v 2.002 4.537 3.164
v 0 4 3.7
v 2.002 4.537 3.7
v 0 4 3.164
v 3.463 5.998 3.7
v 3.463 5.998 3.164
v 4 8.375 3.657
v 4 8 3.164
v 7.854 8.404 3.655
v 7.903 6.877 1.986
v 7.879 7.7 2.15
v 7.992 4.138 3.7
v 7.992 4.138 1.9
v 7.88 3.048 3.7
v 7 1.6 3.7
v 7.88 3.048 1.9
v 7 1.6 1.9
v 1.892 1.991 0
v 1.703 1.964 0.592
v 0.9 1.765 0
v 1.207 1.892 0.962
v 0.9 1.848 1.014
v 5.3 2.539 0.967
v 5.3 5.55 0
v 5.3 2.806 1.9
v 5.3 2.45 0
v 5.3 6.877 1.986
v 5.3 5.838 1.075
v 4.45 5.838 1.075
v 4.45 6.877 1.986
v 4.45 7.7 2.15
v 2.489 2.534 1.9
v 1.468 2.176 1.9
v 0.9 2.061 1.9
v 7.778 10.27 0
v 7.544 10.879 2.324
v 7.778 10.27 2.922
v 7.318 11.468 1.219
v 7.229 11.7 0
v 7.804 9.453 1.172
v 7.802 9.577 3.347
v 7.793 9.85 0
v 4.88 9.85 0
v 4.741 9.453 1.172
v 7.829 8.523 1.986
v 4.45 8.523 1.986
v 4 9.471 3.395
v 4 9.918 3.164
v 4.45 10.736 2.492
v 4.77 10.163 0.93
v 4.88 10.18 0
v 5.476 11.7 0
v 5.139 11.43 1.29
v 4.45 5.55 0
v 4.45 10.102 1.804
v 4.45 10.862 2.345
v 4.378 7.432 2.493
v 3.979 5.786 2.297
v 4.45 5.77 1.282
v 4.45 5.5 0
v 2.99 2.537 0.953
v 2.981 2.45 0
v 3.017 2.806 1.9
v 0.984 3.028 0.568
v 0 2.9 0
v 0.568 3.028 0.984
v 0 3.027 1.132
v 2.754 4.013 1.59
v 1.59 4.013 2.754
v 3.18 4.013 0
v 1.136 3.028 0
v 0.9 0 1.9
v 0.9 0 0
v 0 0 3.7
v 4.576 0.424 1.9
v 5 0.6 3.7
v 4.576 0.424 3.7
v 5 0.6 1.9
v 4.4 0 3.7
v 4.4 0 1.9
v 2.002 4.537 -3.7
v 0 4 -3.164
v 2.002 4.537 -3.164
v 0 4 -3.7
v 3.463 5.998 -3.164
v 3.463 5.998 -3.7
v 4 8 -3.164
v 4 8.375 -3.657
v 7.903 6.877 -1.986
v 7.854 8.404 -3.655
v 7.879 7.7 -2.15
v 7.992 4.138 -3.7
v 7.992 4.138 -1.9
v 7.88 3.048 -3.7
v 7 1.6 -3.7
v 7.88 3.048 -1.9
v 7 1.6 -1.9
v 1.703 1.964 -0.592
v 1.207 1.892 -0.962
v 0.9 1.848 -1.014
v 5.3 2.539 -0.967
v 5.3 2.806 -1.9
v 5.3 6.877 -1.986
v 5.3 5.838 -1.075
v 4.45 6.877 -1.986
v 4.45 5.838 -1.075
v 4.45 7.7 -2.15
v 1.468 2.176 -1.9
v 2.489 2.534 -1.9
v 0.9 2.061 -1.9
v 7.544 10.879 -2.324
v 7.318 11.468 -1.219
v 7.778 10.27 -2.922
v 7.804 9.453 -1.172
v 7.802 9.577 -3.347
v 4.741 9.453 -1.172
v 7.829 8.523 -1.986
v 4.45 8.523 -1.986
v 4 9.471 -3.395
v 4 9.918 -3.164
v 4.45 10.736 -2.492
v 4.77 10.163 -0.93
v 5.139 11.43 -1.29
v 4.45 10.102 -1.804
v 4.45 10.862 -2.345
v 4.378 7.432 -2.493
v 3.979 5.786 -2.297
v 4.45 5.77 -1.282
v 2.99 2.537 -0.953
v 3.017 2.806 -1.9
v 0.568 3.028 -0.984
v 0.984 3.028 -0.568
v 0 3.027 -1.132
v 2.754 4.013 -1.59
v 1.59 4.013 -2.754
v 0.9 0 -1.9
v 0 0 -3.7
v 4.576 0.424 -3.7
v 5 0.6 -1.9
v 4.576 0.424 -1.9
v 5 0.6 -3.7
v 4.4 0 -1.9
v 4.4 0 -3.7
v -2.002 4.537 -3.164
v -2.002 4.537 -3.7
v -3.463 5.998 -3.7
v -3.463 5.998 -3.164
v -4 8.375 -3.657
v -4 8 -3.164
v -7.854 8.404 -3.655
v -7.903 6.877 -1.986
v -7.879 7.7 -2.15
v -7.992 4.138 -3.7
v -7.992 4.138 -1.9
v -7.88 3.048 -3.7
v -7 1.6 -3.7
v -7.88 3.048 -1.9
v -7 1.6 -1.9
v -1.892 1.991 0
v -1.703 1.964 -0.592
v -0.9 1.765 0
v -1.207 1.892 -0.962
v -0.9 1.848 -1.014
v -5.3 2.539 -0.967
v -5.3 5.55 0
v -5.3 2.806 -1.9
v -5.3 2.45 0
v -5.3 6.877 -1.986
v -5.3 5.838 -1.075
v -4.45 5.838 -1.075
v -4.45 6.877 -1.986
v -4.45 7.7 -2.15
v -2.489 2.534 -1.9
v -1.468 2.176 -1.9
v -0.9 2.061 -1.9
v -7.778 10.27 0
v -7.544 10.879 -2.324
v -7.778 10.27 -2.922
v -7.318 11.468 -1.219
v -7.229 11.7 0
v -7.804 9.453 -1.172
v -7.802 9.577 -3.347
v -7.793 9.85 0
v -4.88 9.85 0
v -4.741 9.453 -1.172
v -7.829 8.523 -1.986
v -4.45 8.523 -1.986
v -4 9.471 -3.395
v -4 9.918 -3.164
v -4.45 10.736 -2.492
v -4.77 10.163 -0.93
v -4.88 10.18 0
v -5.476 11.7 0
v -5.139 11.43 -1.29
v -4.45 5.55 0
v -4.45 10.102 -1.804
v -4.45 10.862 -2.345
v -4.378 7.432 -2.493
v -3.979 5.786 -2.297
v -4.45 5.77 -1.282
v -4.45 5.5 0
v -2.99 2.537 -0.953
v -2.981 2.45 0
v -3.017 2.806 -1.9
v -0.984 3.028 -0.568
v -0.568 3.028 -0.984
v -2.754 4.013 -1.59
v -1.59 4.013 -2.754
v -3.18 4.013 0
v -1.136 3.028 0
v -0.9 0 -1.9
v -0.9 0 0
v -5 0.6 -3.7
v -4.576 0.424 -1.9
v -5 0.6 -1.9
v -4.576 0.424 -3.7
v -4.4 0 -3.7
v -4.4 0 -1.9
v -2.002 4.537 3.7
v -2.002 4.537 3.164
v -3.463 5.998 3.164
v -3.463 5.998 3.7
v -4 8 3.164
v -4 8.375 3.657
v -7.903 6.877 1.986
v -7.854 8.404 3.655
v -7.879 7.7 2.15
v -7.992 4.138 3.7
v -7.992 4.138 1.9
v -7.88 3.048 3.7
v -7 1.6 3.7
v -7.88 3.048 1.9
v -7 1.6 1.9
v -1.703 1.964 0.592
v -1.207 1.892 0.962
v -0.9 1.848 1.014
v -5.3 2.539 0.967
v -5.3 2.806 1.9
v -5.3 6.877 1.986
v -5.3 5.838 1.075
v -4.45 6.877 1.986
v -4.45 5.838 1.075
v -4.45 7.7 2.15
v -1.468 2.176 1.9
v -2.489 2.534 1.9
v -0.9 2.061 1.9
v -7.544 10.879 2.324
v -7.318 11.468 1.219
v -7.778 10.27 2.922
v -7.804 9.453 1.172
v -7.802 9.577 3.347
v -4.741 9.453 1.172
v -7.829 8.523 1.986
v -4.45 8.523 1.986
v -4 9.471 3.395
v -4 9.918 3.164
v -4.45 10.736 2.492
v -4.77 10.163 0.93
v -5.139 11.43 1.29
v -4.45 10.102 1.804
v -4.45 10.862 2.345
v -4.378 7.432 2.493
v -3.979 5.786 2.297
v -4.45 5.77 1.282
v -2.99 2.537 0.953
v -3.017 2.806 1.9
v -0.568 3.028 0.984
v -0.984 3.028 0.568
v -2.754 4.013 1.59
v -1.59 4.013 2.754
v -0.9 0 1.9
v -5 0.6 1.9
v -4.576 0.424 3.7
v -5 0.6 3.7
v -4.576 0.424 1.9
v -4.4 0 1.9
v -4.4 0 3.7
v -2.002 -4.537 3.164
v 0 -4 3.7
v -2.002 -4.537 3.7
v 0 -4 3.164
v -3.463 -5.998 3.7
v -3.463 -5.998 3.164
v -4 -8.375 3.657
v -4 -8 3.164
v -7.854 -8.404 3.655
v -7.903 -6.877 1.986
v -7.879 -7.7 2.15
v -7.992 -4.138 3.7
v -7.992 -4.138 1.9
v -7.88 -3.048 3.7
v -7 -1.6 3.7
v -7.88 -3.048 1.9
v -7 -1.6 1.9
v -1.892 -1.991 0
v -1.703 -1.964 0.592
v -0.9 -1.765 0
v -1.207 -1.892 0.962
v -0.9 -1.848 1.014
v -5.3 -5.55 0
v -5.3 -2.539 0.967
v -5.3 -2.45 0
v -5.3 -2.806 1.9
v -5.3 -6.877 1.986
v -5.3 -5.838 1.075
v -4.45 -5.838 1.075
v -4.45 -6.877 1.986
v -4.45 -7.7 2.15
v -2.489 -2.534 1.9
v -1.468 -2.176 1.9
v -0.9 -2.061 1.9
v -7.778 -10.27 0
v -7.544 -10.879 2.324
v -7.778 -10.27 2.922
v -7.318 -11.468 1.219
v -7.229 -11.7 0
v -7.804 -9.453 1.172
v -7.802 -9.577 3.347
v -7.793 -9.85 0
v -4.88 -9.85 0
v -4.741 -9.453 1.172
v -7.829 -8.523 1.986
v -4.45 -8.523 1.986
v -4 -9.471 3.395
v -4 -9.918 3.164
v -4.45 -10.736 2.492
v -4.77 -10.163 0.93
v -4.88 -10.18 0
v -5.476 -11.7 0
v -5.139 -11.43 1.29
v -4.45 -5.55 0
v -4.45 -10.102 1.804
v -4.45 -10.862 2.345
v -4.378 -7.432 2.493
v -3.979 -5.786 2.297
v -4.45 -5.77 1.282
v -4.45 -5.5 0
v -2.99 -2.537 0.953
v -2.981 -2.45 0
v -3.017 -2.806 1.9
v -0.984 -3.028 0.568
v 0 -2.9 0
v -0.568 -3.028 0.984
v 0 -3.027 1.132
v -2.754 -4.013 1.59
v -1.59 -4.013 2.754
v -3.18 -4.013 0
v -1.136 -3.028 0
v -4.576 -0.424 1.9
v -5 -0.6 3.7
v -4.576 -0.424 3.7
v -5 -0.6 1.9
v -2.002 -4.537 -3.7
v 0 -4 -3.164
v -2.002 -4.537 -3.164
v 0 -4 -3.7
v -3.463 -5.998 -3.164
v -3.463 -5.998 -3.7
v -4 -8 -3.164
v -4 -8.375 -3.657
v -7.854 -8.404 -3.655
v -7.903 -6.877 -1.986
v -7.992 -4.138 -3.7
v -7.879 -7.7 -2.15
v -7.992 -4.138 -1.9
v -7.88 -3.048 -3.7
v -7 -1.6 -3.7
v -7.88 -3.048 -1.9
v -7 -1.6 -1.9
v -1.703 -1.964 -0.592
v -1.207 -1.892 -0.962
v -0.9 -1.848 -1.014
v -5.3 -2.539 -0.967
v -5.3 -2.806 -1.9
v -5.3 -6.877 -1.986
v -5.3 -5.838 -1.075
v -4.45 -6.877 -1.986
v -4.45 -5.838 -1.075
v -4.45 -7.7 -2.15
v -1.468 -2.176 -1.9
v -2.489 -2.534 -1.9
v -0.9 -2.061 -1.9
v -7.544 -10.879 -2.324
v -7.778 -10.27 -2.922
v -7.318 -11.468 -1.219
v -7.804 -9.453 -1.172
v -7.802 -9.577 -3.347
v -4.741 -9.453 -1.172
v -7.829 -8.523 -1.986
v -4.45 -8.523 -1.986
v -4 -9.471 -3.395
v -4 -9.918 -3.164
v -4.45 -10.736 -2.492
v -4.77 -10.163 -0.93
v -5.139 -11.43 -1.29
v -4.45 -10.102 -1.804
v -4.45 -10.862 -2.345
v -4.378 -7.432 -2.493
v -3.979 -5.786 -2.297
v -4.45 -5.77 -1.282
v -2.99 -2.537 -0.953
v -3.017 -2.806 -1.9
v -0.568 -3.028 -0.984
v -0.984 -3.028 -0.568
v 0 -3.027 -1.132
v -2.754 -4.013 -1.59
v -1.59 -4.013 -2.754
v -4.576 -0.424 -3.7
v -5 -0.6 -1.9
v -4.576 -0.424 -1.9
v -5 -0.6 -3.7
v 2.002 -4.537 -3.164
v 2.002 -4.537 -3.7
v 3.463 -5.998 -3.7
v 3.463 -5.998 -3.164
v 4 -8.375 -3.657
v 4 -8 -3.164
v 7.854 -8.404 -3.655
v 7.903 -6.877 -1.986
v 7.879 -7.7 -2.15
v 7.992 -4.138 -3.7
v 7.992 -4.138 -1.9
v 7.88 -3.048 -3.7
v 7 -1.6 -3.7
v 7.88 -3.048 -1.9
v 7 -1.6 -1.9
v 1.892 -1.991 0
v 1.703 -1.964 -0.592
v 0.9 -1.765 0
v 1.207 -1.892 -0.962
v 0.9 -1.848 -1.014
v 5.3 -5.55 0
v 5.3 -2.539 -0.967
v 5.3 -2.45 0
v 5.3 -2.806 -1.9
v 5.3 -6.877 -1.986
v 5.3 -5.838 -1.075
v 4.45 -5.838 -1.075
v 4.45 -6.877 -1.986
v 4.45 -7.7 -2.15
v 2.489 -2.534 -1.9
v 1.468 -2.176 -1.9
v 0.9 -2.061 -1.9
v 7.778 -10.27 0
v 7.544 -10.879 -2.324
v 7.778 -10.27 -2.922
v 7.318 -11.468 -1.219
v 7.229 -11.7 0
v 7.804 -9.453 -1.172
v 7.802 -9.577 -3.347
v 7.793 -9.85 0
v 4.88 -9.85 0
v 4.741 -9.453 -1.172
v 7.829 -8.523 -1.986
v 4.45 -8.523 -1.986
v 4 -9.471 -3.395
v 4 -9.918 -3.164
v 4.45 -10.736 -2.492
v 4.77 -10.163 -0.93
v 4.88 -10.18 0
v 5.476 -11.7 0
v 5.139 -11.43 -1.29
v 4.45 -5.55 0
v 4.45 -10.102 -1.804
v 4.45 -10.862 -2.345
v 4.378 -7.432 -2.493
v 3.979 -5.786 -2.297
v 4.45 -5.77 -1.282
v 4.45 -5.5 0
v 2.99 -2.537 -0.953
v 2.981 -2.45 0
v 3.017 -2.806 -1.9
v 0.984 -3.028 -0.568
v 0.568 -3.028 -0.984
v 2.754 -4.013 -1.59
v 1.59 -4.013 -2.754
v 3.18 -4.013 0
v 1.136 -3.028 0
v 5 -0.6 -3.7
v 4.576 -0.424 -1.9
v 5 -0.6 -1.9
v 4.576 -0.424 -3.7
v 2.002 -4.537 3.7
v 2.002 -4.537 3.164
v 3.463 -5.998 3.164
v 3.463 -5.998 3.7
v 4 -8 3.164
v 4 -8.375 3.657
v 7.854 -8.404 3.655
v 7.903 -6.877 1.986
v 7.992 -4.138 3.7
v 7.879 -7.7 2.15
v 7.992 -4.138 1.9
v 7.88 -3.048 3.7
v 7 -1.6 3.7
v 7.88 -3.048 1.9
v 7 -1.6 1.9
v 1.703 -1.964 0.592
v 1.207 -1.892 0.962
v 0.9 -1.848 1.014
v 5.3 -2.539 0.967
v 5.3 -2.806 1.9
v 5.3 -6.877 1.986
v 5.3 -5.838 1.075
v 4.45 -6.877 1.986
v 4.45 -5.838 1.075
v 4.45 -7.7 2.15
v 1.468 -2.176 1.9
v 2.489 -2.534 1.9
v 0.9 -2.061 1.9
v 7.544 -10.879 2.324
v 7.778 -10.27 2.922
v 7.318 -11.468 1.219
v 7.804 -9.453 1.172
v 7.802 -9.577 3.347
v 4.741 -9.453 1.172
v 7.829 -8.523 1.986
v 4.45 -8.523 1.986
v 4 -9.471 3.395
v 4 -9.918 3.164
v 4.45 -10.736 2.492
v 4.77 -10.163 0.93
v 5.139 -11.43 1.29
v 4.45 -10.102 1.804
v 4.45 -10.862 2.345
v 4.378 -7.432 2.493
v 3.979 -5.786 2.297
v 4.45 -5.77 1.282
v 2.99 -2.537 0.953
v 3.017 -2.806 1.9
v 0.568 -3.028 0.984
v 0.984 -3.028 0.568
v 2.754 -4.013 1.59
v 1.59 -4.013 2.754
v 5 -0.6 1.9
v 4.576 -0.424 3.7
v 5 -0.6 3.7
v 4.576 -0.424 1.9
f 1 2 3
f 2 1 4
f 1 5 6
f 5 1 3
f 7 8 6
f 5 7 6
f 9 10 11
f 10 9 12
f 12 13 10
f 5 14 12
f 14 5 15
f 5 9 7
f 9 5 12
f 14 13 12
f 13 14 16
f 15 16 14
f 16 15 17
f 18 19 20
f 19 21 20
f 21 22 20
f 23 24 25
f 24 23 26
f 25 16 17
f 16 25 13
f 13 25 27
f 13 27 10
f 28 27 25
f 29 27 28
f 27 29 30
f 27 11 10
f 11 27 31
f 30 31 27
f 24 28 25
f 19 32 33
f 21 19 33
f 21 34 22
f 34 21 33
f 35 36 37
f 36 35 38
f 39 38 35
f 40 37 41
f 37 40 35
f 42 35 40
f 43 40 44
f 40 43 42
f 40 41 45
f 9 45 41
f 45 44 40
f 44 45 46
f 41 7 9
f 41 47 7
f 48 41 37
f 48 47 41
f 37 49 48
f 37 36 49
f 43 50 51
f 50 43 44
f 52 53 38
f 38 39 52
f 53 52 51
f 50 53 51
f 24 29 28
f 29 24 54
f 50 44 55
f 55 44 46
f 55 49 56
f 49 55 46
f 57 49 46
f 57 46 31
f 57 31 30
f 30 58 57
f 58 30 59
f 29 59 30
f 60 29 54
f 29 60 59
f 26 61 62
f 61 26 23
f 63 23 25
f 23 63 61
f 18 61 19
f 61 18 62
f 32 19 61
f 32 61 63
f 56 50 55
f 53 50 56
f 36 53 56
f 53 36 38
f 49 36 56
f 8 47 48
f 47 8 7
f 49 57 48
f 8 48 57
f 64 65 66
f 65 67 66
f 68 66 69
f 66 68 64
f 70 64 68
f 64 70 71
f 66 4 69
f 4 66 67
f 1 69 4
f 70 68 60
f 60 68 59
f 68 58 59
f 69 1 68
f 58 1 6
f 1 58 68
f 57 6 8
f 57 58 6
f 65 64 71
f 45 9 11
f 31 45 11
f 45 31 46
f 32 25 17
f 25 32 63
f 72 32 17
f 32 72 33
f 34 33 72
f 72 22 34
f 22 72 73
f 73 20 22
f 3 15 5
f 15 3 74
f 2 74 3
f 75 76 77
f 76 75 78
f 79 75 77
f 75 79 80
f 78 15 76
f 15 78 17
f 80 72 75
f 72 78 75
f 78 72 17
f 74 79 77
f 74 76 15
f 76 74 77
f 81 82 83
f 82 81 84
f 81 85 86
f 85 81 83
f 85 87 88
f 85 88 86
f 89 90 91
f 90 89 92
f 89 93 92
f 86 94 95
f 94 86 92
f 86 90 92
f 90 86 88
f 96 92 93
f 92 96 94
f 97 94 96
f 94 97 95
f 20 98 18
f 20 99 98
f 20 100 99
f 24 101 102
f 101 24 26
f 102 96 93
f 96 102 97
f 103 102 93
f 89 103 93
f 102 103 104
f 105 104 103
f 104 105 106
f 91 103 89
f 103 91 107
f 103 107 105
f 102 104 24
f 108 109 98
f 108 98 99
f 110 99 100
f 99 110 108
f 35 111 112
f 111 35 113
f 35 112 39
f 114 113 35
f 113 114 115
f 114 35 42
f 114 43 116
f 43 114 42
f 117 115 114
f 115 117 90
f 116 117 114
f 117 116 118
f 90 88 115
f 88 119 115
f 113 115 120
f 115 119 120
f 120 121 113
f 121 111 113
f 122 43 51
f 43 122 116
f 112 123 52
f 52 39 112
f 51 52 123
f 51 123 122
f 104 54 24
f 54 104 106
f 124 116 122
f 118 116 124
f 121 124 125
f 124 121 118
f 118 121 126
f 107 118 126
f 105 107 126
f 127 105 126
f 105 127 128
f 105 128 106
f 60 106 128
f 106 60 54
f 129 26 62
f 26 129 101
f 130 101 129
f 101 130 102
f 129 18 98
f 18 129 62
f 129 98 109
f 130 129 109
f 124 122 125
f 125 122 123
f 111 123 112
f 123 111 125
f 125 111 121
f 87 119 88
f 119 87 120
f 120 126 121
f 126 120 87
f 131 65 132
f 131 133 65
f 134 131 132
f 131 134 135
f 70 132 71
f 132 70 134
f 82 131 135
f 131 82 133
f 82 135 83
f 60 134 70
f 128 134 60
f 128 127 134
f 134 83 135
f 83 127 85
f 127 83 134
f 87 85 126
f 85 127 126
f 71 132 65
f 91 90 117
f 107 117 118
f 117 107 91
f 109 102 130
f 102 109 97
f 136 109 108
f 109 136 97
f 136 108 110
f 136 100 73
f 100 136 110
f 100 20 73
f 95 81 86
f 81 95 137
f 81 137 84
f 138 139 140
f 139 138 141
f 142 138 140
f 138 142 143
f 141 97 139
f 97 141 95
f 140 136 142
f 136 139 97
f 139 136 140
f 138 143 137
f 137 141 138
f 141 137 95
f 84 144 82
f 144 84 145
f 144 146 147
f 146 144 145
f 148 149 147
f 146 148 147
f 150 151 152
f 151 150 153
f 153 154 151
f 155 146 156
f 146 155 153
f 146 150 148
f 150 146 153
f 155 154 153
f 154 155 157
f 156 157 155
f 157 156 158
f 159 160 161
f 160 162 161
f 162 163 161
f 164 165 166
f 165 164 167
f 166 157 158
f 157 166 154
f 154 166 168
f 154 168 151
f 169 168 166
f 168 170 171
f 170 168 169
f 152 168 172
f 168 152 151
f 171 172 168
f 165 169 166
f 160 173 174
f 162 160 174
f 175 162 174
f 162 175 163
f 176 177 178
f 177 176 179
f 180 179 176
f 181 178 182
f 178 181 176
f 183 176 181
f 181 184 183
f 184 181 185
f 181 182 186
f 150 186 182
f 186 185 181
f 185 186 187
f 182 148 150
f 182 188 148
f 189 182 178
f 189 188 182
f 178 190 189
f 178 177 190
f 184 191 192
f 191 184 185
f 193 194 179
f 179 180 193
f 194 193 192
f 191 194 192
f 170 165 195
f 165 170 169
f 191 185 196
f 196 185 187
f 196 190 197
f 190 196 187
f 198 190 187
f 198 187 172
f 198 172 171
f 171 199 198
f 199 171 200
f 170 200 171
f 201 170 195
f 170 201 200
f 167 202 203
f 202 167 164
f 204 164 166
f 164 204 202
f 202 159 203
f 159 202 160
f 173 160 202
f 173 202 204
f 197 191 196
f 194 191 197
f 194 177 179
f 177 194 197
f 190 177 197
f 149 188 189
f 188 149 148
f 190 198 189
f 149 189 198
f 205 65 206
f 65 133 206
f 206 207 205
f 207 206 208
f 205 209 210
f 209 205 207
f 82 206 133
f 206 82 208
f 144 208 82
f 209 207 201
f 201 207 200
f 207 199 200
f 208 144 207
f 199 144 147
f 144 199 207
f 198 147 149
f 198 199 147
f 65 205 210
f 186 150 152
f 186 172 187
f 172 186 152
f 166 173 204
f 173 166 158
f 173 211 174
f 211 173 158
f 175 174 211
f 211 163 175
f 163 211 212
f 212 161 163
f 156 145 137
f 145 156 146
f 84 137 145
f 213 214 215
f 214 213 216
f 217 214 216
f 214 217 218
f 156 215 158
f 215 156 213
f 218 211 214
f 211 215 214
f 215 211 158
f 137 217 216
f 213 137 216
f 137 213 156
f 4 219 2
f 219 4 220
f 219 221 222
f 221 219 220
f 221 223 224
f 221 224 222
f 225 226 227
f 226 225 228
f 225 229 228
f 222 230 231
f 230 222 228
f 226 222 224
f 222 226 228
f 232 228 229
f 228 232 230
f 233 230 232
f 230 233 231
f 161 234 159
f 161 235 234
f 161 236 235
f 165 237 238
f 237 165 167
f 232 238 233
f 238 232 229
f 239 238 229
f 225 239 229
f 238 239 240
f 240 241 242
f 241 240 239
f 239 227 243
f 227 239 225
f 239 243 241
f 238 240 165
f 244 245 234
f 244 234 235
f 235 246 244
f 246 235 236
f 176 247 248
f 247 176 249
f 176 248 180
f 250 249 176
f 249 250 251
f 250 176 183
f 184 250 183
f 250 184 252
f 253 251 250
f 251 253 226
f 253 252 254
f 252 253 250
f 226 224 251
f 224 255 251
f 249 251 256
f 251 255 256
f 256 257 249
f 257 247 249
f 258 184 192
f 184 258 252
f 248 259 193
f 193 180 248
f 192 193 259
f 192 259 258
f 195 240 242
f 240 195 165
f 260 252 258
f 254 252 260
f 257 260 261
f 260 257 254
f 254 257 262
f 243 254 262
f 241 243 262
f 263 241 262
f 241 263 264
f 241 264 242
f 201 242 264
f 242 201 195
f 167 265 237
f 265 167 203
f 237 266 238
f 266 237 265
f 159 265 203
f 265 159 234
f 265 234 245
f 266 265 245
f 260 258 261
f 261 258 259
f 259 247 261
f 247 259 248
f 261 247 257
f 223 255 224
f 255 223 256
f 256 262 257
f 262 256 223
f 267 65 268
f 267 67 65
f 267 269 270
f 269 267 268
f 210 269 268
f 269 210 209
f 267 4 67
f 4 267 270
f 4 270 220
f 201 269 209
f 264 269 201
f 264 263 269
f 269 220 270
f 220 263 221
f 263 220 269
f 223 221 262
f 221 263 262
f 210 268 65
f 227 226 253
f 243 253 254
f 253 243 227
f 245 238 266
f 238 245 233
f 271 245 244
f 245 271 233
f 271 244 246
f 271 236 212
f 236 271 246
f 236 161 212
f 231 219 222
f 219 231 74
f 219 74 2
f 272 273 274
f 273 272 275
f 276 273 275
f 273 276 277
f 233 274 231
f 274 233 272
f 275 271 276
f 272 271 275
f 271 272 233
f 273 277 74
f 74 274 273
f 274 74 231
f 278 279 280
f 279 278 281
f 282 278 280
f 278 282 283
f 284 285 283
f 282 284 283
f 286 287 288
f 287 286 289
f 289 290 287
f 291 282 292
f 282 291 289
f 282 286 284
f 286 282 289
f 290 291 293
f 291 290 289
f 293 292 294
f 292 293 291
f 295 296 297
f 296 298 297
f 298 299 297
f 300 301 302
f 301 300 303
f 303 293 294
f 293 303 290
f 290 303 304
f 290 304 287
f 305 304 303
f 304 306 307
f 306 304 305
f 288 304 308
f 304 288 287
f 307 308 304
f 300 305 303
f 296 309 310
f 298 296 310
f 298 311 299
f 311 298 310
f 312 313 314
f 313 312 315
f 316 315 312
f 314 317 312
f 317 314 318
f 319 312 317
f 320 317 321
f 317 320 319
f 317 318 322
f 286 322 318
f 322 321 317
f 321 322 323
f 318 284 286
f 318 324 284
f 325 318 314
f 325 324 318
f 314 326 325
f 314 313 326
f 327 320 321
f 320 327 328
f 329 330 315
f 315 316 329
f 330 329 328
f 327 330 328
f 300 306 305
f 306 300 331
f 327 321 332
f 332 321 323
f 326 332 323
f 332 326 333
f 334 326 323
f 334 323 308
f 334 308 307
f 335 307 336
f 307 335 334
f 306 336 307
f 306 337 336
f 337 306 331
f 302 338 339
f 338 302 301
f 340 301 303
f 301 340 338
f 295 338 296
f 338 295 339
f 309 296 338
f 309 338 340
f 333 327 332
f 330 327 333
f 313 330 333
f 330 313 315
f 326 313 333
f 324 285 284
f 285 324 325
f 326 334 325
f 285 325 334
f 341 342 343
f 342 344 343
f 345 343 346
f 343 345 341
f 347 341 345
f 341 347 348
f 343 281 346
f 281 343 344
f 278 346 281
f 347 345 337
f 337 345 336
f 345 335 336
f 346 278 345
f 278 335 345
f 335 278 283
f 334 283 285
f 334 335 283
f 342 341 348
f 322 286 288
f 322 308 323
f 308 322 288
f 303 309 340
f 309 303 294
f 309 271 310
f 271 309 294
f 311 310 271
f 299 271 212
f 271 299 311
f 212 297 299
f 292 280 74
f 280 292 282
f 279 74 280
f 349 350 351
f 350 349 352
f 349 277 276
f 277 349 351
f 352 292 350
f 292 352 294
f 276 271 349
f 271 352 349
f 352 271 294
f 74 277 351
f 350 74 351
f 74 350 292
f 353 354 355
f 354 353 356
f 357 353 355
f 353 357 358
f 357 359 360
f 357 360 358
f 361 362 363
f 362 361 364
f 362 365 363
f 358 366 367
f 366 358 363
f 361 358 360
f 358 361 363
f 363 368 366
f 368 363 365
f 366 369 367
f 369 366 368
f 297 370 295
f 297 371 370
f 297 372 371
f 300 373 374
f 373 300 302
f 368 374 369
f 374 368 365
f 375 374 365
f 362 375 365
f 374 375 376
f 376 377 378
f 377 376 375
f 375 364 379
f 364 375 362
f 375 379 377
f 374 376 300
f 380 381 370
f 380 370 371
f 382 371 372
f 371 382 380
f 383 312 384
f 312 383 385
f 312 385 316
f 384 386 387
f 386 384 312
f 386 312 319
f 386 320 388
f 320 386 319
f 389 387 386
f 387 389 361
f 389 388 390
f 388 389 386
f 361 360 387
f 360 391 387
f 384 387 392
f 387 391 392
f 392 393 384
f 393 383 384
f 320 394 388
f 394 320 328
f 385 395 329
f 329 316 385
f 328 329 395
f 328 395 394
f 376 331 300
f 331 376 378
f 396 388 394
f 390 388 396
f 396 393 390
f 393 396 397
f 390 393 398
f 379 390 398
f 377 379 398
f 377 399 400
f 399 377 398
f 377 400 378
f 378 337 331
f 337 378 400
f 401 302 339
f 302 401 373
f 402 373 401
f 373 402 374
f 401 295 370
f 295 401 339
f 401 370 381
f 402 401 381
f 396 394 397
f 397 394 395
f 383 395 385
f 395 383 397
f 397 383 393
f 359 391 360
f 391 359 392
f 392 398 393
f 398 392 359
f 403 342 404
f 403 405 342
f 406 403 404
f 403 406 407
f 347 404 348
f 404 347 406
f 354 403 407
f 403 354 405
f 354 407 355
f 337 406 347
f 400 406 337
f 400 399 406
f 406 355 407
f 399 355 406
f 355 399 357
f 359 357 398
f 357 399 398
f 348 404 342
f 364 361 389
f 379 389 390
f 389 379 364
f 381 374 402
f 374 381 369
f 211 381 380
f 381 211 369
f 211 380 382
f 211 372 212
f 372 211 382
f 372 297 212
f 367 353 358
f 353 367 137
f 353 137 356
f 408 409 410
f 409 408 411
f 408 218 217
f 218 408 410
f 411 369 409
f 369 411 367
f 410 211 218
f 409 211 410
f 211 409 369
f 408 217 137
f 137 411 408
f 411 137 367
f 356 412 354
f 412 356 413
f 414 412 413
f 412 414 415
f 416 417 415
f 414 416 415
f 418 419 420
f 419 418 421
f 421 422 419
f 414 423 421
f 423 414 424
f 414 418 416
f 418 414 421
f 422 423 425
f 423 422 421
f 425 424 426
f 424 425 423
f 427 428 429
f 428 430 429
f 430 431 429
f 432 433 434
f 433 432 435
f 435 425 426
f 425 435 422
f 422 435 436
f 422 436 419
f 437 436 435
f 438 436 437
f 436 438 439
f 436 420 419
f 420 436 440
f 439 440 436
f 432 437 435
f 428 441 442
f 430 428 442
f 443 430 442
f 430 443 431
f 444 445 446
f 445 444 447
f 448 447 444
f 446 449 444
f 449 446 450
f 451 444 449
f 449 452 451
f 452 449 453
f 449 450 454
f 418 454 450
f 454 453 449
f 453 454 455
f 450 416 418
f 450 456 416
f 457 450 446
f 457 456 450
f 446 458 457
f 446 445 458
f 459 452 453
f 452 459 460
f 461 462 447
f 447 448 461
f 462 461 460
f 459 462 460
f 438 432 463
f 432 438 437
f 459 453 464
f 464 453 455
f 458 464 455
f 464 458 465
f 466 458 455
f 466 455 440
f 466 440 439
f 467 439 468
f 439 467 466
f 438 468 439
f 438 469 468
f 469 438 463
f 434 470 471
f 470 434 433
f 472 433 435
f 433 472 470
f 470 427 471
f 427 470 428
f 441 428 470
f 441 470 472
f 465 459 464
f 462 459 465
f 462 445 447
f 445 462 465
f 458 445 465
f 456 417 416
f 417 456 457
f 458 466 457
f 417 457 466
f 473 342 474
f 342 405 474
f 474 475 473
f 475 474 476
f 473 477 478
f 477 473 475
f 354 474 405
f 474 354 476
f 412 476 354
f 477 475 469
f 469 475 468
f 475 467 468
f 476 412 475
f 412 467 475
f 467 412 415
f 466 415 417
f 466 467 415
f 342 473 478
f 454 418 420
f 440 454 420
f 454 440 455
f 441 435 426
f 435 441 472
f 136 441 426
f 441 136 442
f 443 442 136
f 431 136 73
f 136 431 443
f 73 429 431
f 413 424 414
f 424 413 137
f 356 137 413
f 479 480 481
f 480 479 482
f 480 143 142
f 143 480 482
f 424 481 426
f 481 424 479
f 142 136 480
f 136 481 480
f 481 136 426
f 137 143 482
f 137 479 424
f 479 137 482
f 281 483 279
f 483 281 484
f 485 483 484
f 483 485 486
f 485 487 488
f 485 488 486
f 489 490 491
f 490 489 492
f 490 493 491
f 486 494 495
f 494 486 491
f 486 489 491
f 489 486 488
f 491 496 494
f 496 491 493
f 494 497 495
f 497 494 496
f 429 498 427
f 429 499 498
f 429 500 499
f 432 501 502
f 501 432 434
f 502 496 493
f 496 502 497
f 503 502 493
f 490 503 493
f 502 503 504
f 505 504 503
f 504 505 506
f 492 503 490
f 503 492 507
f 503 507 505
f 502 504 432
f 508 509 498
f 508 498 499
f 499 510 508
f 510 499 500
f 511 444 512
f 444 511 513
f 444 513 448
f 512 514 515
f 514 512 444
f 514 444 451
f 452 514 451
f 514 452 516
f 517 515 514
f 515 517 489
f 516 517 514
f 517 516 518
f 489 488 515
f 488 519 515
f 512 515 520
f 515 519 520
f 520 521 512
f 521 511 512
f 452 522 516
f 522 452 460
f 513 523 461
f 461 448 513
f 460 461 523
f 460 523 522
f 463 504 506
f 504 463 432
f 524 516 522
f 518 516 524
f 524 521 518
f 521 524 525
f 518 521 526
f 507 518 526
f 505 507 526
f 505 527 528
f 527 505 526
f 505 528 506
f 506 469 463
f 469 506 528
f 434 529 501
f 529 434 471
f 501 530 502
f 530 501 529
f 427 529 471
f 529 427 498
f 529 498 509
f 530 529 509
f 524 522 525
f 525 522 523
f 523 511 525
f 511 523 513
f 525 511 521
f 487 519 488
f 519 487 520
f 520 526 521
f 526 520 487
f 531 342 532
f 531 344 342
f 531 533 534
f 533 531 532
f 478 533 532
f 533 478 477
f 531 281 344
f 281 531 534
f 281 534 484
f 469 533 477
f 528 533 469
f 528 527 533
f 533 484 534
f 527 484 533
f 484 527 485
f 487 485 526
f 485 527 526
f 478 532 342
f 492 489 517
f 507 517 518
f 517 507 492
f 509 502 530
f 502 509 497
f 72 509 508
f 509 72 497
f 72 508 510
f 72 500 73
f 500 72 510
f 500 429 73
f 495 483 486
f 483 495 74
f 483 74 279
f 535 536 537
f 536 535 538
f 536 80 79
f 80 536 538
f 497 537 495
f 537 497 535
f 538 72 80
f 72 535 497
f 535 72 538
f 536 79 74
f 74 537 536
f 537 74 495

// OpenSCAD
use <../lib.scad>
use <s/98565s01.scad>
$fa=1; $fs=0.2;
function ldraw_lib__98565(realsolid=false) = [
// 0 Constraction Connector  2 x  2 with Double Reinforced Ball Sockets
// 0 Name: 98565.dat
// 0 Author: Magnus Forsberg [MagFors]
// 0 !LDRAW_ORG Part UPDATE 2018-02
// 0 !LICENSE Licensed under CC BY 2.0 and CC BY 4.0 : see CAreadme.txt
// 
// 0 BFC CERTIFY CCW
  [0,"BFC","CERTIFY"],
  [0,"BFC","CCW"],
// 
// 0 !HISTORY 2013-08-14 {LEGO Digital Designer} Original part shape
// 0 !HISTORY 2016-03-26 [MagFors] File preparation for LDraw Parts Tracker
// 0 !HISTORY 2018-12-08 [PTadmin] Official Update 2018-02
// 
// 
// 1 16 0 0 0 1 0 0 0 1 0 0 0 1 s\98565s01.dat
  [1,16,0,0,0,1,0,0,0,1,0,0,0,1, ldraw_lib__s__98565s01(realsolid)],
// 1 16 0 0 0 1 0 0 0 -1 0 0 0 1 s\98565s01.dat
  [1,16,0,0,0,1,0,0,0,-1,0,0,0,1, ldraw_lib__s__98565s01(realsolid)],
// 1 16 0 0 0 -1 0 0 0 -1 0 0 0 1 s\98565s01.dat
  [1,16,0,0,0,-1,0,0,0,-1,0,0,0,1, ldraw_lib__s__98565s01(realsolid)],
// 1 16 0 0 0 -1 0 0 0 1 0 0 0 1 s\98565s01.dat
  [1,16,0,0,0,-1,0,0,0,1,0,0,0,1, ldraw_lib__s__98565s01(realsolid)],
// 1 16 0 0 0 -1 0 0 0 1 0 0 0 -1 s\98565s01.dat
  [1,16,0,0,0,-1,0,0,0,1,0,0,0,-1, ldraw_lib__s__98565s01(realsolid)],
// 1 16 0 0 0 -1 0 0 0 -1 0 0 0 -1 s\98565s01.dat
  [1,16,0,0,0,-1,0,0,0,-1,0,0,0,-1, ldraw_lib__s__98565s01(realsolid)],
// 1 16 0 0 0 1 0 0 0 -1 0 0 0 -1 s\98565s01.dat
  [1,16,0,0,0,1,0,0,0,-1,0,0,0,-1, ldraw_lib__s__98565s01(realsolid)],
// 1 16 0 0 0 1 0 0 0 1 0 0 0 -1 s\98565s01.dat
  [1,16,0,0,0,1,0,0,0,1,0,0,0,-1, ldraw_lib__s__98565s01(realsolid)],
];
module ldraw_lib__98565(step=0, col=false, unit=2/5, alt=false, line=0.2, solid=!$preview)
    makepoly(ldraw_lib__98565(solid), step=step, col=col, unit=unit, alt=alt, line=line, solid=solid);
ldraw_lib__98565(line=0.2);
